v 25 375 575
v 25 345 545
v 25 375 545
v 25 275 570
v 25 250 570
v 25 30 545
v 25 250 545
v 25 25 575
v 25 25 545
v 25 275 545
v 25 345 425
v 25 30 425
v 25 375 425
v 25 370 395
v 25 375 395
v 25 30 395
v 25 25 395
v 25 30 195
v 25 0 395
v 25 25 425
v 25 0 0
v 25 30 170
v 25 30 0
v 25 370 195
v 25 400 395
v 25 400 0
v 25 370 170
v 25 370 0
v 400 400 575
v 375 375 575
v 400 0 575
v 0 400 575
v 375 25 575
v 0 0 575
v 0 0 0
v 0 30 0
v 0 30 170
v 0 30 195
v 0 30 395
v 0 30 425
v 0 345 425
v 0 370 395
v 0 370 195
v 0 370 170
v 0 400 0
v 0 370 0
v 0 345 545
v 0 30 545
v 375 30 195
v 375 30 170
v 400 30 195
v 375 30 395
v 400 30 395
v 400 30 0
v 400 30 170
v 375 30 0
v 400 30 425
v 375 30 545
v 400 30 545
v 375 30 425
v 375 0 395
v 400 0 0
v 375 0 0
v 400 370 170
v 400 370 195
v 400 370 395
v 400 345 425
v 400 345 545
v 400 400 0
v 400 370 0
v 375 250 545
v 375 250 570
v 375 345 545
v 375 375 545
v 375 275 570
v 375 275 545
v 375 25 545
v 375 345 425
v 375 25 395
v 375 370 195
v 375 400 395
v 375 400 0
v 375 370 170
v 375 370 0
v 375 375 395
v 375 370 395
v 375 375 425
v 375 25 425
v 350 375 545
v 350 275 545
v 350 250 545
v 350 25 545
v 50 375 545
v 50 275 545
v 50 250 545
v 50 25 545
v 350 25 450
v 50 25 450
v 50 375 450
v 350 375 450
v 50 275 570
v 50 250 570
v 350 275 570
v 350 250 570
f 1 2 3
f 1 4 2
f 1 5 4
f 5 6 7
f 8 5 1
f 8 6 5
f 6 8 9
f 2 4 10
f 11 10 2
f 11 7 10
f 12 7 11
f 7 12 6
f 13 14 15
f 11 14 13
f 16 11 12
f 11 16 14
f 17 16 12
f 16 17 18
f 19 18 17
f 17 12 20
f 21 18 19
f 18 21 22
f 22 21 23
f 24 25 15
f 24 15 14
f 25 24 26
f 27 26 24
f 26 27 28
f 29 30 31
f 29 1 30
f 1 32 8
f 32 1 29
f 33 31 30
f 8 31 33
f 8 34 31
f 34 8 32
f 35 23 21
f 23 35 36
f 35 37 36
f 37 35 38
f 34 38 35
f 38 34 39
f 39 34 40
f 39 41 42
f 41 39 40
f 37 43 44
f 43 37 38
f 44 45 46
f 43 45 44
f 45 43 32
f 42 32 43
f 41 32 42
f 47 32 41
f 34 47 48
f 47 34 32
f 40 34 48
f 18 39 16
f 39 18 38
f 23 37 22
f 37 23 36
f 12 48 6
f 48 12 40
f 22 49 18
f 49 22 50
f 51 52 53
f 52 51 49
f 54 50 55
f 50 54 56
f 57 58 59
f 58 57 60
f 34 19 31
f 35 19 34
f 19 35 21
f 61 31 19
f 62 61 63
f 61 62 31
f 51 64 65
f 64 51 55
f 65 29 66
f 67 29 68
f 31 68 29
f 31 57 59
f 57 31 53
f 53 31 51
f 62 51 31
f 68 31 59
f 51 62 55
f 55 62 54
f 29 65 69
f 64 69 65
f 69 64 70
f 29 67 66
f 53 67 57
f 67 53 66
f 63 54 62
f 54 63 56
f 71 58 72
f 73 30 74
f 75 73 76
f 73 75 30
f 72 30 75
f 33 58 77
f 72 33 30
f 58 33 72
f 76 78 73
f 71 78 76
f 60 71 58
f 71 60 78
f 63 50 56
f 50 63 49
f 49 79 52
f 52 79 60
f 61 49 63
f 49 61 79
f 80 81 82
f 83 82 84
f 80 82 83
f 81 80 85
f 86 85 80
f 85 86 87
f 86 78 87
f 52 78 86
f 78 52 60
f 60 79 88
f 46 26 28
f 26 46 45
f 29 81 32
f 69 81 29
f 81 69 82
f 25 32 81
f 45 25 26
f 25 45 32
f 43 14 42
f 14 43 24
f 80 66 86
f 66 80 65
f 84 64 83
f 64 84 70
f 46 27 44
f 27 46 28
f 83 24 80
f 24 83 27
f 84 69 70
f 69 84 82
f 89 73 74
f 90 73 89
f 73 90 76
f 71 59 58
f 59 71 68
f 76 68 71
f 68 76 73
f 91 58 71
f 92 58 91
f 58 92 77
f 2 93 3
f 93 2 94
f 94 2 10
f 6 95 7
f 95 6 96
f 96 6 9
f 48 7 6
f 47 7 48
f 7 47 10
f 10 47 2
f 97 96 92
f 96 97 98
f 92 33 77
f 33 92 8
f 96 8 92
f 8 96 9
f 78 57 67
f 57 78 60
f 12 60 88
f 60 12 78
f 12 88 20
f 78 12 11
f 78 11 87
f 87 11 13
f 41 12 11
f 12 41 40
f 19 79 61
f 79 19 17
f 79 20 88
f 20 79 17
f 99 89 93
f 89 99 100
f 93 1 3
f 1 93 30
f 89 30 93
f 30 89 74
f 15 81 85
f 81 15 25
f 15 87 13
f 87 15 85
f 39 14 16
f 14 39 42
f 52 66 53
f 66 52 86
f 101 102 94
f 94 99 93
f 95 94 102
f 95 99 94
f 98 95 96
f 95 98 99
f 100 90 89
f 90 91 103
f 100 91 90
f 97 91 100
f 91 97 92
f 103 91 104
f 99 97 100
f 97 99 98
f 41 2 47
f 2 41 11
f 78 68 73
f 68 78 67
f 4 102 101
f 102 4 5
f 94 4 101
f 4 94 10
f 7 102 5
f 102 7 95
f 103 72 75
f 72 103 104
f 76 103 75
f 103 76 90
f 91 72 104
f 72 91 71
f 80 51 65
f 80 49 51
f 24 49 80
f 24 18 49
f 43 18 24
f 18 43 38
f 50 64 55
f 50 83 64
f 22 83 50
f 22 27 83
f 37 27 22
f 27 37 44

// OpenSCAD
/*

    Nightstand
    
    By Anton Augustsson
    
    
*/



/*
    ---------- Variables ---------- 
*/

thickness = 25; // Ash

totalHeight = 600;  
totalWidth  = 420;
totalDepth  = 420;

extraWidth = 10;  // Each side 
extraDepth = 10;  // Each side

legWidth     = 30; 
legLength    = totalHeight-thickness;
legThickness = thickness;

tenonWidth     = thickness;
tenonLengthX   = totalWidth-extraWidth*2; 
tenonLengthY   = totalDepth-extraDepth*2-legWidth*2; 
tenonThickness = legWidth;

boxHeight = 120;
boxWidth  = totalWidth-extraWidth*2-legThickness*2;
boxDepth  = totalDepth-extraDepth*2-thickness*2;
boxBottomWidth = boxWidth-thickness*2;

shelfPositionHeight = 140;
shelfWidth = tenonThickness;



/* 
    ---------- Code ----------
*/



// ---------- Leg ----------

color("Wheat")
union(){
         
// leg 1
translate([
    0,
    0,
    0]) 
cube(size = [
    legThickness,
    legWidth,
    legLength]);
    
// leg 2
translate([
    tenonLengthX-legThickness,
    0,
    0]) 
cube(size = [
    legThickness,
    legWidth,
    legLength]);
    
// leg 3
translate([
    0,
    tenonLengthY+legWidth,
    0]) 
cube(size = [
    legThickness,
    legWidth,
    legLength]);
    
// leg 4
translate([
    tenonLengthX-legThickness,
    tenonLengthY+legWidth,
    0]) 
cube(size = [
    legThickness,
    legWidth,
    legLength]);
    

// ---------- Tenons ----------

// front upper tenon
translate([
    0,
    0,
    legLength-tenonThickness]) 
cube(size = [
    tenonLengthX,
    tenonWidth,
    tenonThickness]);
    
// front lower tenon
translate([
    0,
    0,
    legLength-tenonThickness*2-boxHeight]) 
cube(size = [
    tenonLengthX,
    tenonWidth,
    tenonThickness]);
     
// back upper tenon
translate([
    0,
    tenonLengthY+legWidth*2-tenonWidth,
    legLength-tenonThickness]) 
cube(size = [
    tenonLengthX,
    tenonWidth,
    tenonThickness]);
    
// back lower tenon
translate([
    0,
    tenonLengthY+legWidth*2-tenonWidth,
    legLength-tenonThickness*2-boxHeight]) 
cube(size = [
    tenonLengthX,
    tenonWidth,
    tenonThickness]);

// left upper tenon
translate([
    0,
    legWidth,
    legLength-tenonThickness]) 
cube(size = [
    tenonWidth,
    tenonLengthY,
    tenonThickness]);

// left lower tenon
translate([
    0,
    legWidth,
    legLength-tenonThickness*2-boxHeight]) 
cube(size = [
    tenonWidth,
    tenonLengthY,
    tenonThickness]);

// right upper tenon
translate([
    tenonLengthX-legThickness,
    legWidth,
    legLength-tenonThickness]) 
cube(size = [
    tenonWidth,
    tenonLengthY,
    tenonThickness]);

// right lower tenon
translate([
    tenonLengthX-legThickness,
    legWidth,
    legLength-tenonThickness*2-boxHeight]) 
cube(size = [
    tenonWidth,
    tenonLengthY,
    tenonThickness]);
    
}


/* 
  ---------- Shelf ----------
*/

color("tan")
// Shelf
translate([
    0,
    legWidth,
    shelfPositionHeight+tenonThickness]) 
cube(size = [
    tenonLengthX,
    tenonLengthY,
    thickness]);


/* 
  ---------- Box ----------
*/

color("tan")
union(){ 
// Box Front
translate([
    legThickness,
    0,
    legLength-boxHeight-tenonThickness]) 
cube(size = [
    boxWidth,
    thickness,
    boxHeight]);
    
// Box Back
translate([
    legThickness,
    tenonLengthY+legWidth*2-thickness,
    legLength-boxHeight-tenonThickness]) 
cube(size = [
    boxWidth,
    thickness,
    boxHeight]);
    
// Box Left side
translate([
    legThickness,
    thickness,
    legLength-boxHeight-tenonThickness]) 
cube(size = [
    thickness,
    boxDepth,
    boxHeight]);
    
// Box Right side
translate([
    legThickness+boxWidth-thickness,
    thickness,
    legLength-boxHeight-tenonThickness]) 
cube(size = [
    thickness,
    boxDepth,
    boxHeight]);
    
// Box Bottom
translate([
    legThickness+thickness,
    thickness,
    legLength-boxHeight-tenonThickness]) 
cube(size = [
    boxBottomWidth,
    boxDepth,
    thickness]);

// Box left side stop
translate([
    0,
    legWidth+tenonLengthY-thickness,
    legLength-boxHeight-tenonThickness]) 
cube(size = [
    thickness,
    thickness,
    boxHeight]);
    
// Box Right side stop
translate([
    legThickness+boxWidth,
    legWidth+tenonLengthY-thickness,
    legLength-boxHeight-tenonThickness]) 
cube(size = [
    thickness,
    thickness,
    boxHeight]);
 
// Box Top Left 
translate([
    tenonWidth,
    250,
    legLength-boxHeight-tenonThickness+boxHeight]) 
cube(size = [
    thickness,
    thickness,
    thickness]);
    
// Box Top Right 
translate([
    legThickness+boxWidth-thickness,
    250,
    legLength-boxHeight-tenonThickness+boxHeight]) 
cube(size = [
    thickness,
    thickness,
    thickness]);
}


/* 
  ---------- Top ----------


color("Sienna")
translate([
    -extraWidth,
    -extraDepth,
    totalHeight-thickness]) 
cube(size = [
    totalWidth,
    totalDepth,
    thickness]);
*/
